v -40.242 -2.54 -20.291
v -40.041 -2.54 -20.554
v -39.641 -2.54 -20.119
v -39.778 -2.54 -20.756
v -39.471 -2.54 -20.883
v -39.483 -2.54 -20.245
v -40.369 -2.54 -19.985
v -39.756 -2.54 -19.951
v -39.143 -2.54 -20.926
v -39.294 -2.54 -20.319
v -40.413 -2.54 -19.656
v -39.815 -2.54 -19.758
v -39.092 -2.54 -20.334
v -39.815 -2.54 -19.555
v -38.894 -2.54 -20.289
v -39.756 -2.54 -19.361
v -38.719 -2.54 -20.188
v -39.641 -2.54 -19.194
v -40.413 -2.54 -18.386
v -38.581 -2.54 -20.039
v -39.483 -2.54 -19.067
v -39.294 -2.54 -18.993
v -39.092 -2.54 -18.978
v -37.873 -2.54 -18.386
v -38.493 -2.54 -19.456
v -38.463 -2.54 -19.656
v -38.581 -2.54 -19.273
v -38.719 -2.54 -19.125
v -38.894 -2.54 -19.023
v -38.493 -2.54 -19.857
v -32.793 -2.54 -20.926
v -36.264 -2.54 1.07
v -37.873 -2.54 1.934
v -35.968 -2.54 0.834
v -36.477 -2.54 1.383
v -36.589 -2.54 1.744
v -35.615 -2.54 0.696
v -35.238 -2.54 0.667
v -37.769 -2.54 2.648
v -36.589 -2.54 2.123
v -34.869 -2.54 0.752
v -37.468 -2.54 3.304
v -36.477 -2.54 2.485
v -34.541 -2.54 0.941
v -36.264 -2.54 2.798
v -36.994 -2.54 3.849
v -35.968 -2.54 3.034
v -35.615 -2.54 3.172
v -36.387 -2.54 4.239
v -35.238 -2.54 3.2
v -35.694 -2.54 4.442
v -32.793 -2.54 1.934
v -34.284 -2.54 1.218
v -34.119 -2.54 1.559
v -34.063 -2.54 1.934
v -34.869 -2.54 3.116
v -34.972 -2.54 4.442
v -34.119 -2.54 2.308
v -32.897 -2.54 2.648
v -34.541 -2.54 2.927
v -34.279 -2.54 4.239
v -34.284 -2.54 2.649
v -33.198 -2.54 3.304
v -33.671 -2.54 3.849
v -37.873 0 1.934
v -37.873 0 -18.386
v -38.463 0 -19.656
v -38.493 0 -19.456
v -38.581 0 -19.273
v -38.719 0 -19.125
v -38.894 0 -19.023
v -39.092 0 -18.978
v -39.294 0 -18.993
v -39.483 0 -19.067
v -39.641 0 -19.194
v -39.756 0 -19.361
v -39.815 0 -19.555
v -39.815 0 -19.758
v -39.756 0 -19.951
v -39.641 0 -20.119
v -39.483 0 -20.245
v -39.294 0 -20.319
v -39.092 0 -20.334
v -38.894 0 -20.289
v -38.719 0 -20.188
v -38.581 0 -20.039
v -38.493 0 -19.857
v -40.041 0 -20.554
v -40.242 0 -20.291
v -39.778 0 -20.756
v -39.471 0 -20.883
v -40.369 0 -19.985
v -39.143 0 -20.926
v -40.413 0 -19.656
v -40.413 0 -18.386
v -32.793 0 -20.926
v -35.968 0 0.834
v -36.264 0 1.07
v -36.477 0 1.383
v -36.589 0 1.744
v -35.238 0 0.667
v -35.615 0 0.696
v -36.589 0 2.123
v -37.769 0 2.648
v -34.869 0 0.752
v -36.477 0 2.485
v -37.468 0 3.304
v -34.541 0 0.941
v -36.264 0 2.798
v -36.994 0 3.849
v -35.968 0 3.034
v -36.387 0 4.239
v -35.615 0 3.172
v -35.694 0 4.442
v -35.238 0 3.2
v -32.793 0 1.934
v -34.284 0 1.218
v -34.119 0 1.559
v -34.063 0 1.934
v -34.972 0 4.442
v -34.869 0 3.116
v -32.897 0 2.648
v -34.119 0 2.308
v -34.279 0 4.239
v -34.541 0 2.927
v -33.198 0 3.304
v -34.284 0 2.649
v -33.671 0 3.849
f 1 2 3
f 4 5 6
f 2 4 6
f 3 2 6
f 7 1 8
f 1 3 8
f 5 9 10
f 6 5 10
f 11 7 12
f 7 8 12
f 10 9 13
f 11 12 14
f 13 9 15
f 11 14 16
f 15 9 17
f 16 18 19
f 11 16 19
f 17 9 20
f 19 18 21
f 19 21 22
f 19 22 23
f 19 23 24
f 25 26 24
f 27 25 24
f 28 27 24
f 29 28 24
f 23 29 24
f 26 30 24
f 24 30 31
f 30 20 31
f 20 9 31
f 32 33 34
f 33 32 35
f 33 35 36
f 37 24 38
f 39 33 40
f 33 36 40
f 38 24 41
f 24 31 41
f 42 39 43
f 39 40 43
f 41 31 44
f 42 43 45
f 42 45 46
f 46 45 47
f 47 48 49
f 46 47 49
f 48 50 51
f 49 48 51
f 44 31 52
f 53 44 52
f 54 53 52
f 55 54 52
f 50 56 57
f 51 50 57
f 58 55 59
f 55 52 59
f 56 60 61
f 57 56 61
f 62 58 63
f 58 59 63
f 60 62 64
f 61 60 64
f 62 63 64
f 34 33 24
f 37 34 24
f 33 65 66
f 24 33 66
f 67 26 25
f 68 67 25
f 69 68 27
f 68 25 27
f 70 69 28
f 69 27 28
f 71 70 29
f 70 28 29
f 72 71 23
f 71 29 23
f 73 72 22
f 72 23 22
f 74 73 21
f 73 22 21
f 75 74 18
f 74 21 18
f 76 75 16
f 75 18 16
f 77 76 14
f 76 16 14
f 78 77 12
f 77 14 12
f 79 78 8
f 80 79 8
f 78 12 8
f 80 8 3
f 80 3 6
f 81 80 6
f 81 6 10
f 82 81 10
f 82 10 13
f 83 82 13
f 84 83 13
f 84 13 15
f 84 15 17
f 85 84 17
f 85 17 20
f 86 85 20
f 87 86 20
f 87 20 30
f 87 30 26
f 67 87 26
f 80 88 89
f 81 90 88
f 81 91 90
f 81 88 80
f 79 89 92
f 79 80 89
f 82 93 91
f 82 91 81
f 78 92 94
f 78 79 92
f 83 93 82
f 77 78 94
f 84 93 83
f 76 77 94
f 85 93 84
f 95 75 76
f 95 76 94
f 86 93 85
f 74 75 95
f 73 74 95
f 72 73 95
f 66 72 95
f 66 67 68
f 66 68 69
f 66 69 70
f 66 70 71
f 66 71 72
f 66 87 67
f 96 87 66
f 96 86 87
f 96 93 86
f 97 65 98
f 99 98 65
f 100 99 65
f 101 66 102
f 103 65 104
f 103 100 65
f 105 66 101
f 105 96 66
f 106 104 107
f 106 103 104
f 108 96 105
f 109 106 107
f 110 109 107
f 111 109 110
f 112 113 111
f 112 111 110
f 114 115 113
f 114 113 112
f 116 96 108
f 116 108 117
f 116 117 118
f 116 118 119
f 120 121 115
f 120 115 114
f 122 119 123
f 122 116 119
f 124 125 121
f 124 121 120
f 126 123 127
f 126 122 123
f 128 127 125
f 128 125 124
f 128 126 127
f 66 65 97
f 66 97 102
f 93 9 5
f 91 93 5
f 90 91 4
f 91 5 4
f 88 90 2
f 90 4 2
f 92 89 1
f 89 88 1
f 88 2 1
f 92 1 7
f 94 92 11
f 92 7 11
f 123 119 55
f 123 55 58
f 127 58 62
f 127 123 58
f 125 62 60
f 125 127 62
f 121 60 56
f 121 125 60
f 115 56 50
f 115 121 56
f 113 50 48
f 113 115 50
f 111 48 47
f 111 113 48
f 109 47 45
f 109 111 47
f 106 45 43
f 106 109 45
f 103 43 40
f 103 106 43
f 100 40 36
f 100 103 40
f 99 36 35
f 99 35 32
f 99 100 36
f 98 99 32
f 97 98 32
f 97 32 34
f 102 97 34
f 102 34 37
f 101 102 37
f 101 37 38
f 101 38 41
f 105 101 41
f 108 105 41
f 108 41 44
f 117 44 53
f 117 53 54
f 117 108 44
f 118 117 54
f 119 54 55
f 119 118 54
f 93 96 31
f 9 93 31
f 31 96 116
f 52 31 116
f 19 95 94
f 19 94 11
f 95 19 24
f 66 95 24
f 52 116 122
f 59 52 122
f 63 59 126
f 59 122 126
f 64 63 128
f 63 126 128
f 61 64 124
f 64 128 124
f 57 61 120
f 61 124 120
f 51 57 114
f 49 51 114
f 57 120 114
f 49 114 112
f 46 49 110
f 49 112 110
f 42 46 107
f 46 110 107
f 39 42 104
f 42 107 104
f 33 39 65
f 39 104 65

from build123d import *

# Parameters (mm, degrees)
F0_R     = 1.27
F1_DEPTH = 2.54
F2_W     = 2.54
F2_H     = 5.08
F3_DEPTH = 2.54
F4_W     = 2.54
F4_H     = 2.54
F4_R     = 0.680019
F5_DEPTH = 25.4


with BuildPart() as f1:
    # F0 (on Front) → F1 (new body)
    with BuildSketch(Plane.XZ):
        with BuildLine():
            ThreePointArc((-32.792888, 1.933751), (-35.332888, 4.468064), (-37.872888, 1.933751))
            Line((-37.872888, 1.933751), (-37.872888, -20.926249))
            Line((-37.872888, -20.926249), (-32.792888, -20.926249))
            Line((-32.792888, -20.926249), (-32.792888, 1.933751))
        make_face()
        with Locations((-35.332888, 1.933751)):
            Circle(F0_R, mode=Mode.SUBTRACT)
    extrude(amount=F1_DEPTH)

    # F2 (on face) → F3 (join)
    with BuildSketch(Plane(origin=(-37.872888, 0, 0), x_dir=(0, -1, 0), z_dir=(-1, 0, 0))):
        with Locations((1.27, -18.386249)):
            Rectangle(F2_W, F2_H)
    extrude(amount=F3_DEPTH)

    # F4 (on face) → F5 (cut)
    with BuildSketch(Plane.XZ.offset(2.54)):
        with Locations((-39.142888, -17.116249)):
            Rectangle(F4_W, F4_H)
        with Locations((-39.142888, -19.656249)):
            Circle(F4_R)
        with BuildLine():
            ThreePointArc((-39.142888, -20.926249), (-40.040536, -20.553897), (-40.412888, -19.656249))
            Line((-40.412888, -19.656249), (-40.412888, -20.926249))
            Line((-40.412888, -20.926249), (-39.142888, -20.926249))
        make_face()
    extrude(amount=-F5_DEPTH, mode=Mode.SUBTRACT)


solid = f1.part
